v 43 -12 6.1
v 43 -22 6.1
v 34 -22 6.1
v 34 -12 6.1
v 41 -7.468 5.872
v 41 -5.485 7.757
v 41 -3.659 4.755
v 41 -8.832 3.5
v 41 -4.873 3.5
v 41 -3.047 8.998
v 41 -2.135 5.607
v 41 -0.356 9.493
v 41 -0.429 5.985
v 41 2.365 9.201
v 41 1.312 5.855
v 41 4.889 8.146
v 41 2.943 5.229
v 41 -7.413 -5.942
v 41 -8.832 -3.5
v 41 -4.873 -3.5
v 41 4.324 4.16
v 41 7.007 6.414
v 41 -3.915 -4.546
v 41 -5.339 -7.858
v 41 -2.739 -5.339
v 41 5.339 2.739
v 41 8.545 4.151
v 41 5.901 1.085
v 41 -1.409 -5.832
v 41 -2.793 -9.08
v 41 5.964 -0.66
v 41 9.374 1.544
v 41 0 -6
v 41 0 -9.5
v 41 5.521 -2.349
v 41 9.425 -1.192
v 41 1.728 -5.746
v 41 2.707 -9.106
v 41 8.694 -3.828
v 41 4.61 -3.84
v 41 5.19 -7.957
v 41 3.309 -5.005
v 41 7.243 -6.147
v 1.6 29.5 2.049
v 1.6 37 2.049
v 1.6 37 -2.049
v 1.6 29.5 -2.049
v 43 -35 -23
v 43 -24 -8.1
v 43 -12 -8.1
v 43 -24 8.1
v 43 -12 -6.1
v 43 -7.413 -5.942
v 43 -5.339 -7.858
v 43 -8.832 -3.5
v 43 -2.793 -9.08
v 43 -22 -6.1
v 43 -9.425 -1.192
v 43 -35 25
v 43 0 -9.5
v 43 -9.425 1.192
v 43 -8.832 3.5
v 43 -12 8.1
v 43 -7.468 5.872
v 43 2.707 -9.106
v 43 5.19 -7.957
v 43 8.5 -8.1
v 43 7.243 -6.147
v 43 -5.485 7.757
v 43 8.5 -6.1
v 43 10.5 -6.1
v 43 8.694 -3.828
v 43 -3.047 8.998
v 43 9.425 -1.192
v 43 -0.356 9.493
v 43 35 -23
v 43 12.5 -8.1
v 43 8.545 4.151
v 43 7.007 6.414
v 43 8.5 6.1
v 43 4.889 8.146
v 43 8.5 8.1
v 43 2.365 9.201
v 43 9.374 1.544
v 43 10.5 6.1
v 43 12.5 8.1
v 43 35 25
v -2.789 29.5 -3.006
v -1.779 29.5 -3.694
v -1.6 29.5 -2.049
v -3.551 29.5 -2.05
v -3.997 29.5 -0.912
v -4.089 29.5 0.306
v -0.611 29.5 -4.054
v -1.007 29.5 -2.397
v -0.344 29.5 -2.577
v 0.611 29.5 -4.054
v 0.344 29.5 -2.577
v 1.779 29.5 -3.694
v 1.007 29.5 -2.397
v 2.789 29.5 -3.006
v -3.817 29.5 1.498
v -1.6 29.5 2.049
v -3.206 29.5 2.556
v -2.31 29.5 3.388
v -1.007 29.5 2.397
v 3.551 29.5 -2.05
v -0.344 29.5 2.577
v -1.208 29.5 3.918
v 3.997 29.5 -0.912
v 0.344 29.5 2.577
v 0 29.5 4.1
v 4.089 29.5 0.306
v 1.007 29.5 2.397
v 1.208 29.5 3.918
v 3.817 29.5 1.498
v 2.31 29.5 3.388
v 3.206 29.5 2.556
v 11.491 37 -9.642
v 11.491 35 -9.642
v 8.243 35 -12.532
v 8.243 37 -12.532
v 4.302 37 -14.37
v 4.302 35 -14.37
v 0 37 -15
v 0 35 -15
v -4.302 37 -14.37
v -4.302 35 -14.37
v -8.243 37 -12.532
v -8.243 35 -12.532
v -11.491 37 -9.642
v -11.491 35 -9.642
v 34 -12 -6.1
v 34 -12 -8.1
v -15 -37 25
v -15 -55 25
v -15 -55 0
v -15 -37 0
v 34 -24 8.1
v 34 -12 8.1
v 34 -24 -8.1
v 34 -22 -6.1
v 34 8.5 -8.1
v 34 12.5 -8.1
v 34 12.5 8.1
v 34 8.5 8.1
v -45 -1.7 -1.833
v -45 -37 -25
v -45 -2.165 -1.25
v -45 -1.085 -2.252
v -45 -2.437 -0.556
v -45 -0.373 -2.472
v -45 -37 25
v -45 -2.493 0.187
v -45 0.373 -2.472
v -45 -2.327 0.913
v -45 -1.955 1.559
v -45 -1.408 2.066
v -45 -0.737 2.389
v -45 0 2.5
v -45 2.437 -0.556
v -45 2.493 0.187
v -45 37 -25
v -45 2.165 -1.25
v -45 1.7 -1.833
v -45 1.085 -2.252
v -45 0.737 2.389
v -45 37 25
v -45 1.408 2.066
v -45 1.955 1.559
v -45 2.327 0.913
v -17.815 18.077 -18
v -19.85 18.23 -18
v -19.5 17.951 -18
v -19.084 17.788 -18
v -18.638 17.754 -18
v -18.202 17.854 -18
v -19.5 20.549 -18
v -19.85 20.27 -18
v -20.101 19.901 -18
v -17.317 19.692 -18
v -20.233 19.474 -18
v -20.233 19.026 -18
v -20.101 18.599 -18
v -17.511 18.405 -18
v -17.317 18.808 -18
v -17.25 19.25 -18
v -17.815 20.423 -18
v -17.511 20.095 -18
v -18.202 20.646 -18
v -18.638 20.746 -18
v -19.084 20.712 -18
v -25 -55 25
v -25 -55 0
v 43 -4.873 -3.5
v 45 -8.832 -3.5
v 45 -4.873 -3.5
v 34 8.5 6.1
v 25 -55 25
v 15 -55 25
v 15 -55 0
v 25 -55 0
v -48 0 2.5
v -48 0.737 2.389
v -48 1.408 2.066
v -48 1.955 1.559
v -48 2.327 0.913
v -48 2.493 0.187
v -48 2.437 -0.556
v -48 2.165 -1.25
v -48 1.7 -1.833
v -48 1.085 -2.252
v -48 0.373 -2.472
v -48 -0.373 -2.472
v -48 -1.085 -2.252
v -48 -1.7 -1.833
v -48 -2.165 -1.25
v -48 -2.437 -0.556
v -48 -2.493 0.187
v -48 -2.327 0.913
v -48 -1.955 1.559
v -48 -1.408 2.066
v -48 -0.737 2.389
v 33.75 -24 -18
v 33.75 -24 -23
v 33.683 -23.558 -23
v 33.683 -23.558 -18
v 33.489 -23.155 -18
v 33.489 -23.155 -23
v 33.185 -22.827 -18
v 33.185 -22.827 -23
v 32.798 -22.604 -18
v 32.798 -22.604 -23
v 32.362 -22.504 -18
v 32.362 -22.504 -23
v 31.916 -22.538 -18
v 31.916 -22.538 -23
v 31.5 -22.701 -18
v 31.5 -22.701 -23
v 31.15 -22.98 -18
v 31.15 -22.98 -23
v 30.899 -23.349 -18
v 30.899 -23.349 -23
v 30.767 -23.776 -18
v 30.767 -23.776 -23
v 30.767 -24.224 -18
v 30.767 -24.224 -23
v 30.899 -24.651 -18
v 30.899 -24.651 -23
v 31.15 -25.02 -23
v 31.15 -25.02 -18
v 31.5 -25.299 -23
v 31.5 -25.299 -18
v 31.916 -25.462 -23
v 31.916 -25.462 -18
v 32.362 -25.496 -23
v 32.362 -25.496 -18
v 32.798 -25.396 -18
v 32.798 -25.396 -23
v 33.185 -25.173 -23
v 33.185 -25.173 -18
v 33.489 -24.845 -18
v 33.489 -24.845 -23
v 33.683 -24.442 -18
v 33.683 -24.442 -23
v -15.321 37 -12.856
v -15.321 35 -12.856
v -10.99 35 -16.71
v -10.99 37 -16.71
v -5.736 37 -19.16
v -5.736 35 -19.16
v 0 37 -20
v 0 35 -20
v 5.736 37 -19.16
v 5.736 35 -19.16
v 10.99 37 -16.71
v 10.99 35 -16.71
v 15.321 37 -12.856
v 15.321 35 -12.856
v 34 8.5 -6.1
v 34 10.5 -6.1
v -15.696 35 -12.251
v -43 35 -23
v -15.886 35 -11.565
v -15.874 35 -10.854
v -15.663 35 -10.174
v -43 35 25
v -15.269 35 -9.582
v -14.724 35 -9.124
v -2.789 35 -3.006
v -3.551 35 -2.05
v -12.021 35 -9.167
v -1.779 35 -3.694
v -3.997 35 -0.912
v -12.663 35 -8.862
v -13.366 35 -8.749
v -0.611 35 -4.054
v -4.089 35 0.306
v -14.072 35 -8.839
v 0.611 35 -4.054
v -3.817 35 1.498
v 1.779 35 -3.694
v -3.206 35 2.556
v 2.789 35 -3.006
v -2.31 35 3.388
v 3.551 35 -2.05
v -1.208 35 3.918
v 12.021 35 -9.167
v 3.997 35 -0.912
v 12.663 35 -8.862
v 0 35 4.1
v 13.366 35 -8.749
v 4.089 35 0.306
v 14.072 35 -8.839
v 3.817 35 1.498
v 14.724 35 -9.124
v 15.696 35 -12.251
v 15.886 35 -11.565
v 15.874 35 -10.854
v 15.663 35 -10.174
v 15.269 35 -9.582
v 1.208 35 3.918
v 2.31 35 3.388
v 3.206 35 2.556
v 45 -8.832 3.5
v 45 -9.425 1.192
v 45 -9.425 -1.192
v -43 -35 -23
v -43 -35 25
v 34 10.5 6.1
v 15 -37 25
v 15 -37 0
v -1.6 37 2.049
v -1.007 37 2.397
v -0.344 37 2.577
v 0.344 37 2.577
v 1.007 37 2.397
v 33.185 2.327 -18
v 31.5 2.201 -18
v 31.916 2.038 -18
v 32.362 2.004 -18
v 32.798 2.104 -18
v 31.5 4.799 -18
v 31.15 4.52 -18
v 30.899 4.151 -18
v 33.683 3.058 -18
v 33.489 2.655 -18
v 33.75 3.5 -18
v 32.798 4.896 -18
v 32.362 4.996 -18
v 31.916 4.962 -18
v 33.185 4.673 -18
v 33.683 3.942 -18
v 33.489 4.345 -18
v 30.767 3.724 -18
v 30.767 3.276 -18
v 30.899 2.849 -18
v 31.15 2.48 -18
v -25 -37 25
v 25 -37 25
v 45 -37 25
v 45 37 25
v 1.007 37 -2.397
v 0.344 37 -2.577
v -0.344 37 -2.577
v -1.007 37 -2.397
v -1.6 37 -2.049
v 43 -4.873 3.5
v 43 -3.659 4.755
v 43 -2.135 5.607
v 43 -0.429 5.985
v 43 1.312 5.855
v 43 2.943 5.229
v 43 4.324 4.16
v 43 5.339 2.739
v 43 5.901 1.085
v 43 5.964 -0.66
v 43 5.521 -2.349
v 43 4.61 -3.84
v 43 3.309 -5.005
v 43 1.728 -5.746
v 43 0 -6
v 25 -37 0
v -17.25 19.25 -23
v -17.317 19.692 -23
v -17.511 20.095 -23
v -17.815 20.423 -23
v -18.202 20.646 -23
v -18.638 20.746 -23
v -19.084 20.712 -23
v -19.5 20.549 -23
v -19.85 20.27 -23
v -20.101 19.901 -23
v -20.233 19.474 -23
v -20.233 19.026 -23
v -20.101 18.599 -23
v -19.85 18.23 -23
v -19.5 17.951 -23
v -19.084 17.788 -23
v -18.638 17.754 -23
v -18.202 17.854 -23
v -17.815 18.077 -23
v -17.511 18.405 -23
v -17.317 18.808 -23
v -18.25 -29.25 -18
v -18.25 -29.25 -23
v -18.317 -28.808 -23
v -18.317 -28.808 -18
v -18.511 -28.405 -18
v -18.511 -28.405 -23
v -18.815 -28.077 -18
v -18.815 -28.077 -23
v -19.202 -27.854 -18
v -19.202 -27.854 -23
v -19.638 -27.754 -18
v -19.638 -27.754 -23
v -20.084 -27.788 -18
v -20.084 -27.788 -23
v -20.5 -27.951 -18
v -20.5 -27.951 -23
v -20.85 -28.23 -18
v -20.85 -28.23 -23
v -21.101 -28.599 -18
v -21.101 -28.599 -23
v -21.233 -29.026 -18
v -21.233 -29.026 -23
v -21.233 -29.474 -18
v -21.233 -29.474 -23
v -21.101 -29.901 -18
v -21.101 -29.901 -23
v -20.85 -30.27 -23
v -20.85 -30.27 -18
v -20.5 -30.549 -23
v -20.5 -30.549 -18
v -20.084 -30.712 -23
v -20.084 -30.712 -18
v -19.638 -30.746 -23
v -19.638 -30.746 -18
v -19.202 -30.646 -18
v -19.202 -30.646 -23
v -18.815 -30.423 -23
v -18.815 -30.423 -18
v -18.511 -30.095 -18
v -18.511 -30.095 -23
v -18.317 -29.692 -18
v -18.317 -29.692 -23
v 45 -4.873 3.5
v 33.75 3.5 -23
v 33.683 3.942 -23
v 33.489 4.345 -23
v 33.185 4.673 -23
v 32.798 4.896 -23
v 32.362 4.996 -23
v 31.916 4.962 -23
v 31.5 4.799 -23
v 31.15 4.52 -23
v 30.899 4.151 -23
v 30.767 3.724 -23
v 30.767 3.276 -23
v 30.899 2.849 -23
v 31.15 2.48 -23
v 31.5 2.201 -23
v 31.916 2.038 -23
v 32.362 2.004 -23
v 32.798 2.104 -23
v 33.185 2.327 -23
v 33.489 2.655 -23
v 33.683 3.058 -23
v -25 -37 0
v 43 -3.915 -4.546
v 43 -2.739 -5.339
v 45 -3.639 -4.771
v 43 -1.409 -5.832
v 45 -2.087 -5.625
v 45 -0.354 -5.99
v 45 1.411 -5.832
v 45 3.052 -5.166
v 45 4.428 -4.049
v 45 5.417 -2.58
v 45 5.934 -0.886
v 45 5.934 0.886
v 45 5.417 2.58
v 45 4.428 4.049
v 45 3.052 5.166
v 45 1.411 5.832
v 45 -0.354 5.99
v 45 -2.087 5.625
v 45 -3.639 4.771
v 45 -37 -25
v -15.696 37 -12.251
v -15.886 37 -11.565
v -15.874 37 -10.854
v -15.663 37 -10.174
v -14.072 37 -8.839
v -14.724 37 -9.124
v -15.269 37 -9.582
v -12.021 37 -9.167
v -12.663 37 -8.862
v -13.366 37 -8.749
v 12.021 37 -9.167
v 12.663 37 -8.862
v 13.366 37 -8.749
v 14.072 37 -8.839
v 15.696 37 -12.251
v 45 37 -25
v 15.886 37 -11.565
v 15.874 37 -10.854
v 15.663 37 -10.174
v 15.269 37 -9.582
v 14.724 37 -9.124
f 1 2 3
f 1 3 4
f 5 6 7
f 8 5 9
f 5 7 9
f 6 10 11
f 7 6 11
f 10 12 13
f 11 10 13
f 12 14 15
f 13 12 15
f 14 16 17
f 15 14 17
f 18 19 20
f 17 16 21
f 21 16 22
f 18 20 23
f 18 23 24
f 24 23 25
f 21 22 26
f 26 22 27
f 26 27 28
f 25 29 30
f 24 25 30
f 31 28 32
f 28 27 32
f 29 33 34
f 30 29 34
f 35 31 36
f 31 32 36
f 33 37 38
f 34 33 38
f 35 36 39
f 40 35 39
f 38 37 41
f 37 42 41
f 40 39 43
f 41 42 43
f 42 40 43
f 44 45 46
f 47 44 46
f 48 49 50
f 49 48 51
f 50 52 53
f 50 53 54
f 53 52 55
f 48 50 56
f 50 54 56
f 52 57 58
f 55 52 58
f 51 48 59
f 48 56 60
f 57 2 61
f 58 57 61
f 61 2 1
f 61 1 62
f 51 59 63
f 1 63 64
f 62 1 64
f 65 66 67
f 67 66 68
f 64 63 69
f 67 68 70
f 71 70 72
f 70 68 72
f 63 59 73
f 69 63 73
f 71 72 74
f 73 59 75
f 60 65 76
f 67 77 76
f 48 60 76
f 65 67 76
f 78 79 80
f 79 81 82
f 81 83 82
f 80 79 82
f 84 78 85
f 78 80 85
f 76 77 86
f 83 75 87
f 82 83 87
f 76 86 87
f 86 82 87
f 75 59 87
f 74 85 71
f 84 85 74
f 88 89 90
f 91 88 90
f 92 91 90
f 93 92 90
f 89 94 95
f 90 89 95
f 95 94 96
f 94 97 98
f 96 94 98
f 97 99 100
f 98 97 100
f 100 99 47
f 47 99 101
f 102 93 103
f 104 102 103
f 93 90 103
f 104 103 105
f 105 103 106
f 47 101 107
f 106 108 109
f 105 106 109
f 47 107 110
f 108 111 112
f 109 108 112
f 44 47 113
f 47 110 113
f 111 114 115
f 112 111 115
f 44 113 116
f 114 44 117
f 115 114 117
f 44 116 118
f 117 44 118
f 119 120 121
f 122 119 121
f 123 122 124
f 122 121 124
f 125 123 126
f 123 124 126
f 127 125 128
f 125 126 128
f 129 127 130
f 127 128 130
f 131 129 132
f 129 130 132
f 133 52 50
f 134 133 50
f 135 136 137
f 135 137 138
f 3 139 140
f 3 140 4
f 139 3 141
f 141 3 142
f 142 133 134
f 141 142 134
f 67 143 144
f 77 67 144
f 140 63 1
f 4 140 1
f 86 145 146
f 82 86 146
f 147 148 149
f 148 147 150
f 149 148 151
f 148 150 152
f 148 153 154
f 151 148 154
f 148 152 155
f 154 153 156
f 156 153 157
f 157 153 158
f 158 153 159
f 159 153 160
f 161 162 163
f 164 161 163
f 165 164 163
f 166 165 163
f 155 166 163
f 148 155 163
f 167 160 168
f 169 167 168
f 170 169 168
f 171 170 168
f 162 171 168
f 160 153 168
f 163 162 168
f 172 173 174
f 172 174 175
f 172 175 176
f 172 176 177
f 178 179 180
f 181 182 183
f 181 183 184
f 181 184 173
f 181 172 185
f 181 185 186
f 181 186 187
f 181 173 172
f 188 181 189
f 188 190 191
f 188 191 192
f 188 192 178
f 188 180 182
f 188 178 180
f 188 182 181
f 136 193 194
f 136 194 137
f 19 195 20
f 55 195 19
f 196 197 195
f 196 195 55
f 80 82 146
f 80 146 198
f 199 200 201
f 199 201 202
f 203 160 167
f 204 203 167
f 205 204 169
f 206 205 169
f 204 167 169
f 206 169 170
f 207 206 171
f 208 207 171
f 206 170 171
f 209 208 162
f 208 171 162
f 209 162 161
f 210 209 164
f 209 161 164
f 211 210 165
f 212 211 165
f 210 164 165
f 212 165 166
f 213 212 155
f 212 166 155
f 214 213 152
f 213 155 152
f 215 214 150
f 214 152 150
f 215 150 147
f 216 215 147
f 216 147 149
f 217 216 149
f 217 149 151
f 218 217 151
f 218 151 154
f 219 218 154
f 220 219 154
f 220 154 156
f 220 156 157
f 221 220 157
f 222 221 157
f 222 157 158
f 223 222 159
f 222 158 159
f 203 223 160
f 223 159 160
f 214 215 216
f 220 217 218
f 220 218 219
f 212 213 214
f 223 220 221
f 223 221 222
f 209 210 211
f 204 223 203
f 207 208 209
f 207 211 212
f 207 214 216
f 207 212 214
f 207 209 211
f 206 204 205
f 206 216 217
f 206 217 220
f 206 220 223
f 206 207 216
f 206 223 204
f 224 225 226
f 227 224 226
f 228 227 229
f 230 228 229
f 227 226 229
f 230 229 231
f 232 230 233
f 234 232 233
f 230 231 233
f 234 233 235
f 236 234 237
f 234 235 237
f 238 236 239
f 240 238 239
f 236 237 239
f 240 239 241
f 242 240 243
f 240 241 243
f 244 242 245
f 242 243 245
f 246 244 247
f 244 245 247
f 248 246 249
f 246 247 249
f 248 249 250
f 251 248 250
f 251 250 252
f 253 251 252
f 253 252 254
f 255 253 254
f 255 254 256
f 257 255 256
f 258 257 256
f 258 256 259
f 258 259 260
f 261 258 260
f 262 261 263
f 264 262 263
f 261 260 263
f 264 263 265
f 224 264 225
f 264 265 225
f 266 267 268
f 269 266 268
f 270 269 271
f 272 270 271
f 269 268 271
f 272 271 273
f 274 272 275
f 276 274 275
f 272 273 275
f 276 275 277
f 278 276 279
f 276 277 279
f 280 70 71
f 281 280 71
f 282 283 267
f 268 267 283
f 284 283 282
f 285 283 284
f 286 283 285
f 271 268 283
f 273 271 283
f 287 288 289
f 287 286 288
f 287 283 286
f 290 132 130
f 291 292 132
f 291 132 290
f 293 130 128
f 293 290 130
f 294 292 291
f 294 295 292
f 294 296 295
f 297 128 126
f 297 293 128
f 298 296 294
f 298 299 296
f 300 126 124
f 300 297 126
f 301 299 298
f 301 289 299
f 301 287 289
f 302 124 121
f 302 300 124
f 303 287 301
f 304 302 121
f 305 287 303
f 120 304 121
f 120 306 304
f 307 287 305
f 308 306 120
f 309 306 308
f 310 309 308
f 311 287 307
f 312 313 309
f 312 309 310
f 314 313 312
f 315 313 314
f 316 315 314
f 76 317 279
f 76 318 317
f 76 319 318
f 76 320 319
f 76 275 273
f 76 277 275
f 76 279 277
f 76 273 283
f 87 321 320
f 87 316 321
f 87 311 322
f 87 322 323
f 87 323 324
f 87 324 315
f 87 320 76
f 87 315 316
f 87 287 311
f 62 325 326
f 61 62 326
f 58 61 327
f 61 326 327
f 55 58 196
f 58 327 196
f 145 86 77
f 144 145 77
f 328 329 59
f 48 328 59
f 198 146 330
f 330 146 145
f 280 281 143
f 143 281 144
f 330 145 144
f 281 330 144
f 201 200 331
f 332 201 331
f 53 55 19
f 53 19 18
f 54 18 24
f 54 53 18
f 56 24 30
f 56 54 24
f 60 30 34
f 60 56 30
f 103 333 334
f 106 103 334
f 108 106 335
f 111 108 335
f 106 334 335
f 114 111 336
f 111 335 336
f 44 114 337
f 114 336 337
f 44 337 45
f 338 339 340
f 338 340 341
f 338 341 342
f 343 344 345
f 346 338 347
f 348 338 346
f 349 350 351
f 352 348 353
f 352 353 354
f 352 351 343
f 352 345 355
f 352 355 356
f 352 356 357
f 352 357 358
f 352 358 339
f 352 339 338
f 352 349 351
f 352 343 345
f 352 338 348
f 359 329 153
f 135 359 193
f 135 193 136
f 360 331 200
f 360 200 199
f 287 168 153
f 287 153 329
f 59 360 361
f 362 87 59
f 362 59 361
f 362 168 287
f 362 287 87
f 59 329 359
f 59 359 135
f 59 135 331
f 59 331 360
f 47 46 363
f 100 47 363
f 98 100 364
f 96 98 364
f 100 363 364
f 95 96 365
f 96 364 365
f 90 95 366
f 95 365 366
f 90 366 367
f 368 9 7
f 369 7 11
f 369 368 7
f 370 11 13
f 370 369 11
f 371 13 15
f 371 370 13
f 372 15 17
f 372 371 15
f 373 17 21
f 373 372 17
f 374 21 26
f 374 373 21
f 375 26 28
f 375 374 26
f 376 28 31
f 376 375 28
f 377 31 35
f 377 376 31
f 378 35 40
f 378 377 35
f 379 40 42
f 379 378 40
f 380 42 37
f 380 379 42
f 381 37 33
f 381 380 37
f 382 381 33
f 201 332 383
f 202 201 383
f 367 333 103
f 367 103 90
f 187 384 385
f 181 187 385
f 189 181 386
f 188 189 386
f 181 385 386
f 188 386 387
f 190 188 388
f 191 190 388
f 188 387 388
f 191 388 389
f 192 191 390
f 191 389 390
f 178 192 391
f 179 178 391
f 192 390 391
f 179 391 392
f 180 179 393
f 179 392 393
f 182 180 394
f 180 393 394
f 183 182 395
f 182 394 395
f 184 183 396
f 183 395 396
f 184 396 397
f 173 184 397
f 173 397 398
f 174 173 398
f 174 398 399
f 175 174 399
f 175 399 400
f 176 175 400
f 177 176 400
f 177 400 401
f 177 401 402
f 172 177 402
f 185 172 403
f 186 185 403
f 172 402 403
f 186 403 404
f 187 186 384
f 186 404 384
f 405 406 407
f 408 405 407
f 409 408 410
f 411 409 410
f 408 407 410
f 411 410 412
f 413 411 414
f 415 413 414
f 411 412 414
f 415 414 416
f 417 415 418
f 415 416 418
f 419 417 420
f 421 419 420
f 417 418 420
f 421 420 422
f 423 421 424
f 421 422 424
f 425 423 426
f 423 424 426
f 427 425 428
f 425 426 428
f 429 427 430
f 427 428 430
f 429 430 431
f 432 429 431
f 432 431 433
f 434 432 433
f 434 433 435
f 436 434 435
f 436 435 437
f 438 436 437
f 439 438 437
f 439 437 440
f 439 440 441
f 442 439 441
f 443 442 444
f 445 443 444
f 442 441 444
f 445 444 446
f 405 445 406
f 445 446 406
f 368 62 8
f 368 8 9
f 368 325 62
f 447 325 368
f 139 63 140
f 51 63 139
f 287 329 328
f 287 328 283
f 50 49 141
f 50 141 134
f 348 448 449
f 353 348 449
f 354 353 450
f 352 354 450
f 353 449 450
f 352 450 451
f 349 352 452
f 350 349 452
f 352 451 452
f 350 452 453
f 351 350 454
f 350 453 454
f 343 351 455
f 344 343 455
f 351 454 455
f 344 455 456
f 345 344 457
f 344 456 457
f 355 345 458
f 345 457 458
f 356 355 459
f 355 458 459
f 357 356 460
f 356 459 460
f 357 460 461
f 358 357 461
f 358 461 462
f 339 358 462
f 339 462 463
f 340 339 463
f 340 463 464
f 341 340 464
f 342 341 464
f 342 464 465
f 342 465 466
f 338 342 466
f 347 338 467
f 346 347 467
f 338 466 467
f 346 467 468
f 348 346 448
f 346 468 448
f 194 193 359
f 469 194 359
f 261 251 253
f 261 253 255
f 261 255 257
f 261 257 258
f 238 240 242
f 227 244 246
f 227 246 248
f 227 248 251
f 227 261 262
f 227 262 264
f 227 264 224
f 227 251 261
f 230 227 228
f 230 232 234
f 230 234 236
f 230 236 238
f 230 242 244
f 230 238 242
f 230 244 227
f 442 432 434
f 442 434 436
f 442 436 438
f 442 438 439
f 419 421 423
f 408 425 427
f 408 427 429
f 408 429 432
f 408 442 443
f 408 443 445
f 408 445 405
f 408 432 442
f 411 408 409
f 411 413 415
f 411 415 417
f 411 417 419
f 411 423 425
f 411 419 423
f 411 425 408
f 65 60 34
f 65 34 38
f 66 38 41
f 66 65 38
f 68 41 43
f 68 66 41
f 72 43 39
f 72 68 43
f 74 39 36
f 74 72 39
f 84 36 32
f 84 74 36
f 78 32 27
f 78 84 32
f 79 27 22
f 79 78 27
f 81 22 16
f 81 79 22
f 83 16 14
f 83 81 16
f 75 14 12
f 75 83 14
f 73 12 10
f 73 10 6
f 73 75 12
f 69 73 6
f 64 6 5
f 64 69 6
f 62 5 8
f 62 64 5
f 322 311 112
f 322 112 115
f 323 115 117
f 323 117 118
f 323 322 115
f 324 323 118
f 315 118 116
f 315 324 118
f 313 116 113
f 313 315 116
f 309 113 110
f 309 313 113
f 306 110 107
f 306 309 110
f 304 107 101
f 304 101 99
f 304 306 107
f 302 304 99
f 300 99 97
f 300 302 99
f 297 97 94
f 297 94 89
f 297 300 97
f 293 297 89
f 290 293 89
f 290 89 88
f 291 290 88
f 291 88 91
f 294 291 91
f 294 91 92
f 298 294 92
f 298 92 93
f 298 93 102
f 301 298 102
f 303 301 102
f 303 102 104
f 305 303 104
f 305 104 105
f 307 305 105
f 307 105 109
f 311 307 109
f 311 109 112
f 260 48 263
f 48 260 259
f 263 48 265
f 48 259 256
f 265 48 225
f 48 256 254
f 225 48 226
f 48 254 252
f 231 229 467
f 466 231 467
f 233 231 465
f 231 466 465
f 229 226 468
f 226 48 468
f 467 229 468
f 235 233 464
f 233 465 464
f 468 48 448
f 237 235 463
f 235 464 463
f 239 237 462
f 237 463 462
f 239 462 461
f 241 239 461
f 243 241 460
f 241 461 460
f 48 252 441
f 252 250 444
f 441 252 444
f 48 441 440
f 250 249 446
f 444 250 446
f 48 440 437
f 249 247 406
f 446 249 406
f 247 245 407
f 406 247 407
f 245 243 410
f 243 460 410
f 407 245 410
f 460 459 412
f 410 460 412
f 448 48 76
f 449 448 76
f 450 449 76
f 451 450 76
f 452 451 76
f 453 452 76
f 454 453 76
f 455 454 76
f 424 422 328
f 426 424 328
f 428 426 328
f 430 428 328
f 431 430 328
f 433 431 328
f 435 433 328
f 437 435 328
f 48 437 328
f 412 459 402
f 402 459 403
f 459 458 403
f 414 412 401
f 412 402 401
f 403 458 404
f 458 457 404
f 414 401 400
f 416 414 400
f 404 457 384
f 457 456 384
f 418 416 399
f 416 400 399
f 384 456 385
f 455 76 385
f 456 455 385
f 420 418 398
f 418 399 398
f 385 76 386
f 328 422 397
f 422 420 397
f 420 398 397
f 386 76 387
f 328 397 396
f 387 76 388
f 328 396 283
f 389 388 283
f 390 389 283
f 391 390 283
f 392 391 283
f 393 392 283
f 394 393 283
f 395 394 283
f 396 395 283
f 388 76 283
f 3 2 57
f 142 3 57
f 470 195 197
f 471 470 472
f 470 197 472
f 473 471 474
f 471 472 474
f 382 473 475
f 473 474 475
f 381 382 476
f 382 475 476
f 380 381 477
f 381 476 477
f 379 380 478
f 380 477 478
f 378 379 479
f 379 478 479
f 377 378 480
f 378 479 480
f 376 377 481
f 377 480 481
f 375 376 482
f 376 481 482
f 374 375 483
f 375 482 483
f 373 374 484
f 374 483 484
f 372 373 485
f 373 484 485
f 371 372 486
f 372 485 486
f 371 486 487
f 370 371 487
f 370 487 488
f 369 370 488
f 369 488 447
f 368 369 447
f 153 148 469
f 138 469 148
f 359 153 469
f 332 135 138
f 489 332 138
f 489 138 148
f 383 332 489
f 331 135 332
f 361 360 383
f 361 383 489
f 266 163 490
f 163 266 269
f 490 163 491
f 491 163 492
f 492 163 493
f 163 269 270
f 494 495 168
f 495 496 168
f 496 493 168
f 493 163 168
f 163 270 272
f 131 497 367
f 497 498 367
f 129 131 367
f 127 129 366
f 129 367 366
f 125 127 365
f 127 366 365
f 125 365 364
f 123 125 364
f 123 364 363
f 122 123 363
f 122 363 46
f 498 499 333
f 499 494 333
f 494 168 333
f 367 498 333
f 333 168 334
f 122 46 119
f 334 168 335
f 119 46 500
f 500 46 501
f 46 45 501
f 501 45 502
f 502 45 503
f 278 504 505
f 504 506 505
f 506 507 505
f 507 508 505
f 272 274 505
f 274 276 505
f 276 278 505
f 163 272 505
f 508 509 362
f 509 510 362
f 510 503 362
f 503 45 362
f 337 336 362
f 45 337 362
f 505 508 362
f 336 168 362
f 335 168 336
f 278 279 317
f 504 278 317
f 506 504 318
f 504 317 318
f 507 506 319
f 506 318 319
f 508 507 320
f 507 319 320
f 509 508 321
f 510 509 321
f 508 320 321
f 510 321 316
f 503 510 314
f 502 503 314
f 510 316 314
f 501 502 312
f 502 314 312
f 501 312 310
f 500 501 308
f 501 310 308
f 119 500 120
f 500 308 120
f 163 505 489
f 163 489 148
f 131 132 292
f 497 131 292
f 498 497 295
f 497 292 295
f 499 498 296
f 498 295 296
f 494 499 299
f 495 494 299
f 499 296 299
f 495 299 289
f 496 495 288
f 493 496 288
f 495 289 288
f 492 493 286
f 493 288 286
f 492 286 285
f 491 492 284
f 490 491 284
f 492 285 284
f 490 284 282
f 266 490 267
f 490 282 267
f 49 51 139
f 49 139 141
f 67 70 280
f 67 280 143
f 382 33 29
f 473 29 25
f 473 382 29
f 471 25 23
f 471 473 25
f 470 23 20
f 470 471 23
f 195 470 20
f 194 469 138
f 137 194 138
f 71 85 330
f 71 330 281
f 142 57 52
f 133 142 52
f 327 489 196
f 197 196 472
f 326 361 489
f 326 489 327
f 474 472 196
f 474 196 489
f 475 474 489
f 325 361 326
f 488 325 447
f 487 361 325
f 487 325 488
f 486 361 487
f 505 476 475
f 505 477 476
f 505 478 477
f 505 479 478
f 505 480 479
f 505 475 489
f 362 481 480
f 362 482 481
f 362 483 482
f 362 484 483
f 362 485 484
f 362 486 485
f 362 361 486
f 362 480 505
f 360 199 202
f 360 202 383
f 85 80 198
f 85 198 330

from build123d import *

# Parameters (mm, degrees)
SKETCH1_W           = 90
SKETCH1_H           = 74
SKETCH1_W_2         = 86
SKETCH1_H_2         = 70
BOSS_EXTRUDE1_DEPTH = 25
BOSS_EXTRUDE2_START = 25
SKETCH1_3_W         = 10
SKETCH1_3_H         = 18
BOSS_EXTRUDE2_DEPTH = 25
SKETCH2_W           = 86
SKETCH2_H           = 70
BOSS_EXTRUDE3_DEPTH = 2
SKETCH3_W           = 3.2
SKETCH3_H           = 4.098780306
CUT_EXTRUDE1_DEPTH  = 2
SKETCH3_4_R         = 4.1
SKETCH3_4_R_2       = 2.6
BOSS_EXTRUDE4_DEPTH = 7.5
SKETCH4_R           = 6
CUT_EXTRUDE2_DEPTH  = 2
BOSS_EXTRUDE5_START = -2
BOSS_EXTRUDE5_DEPTH = 2
BOSS_EXTRUDE6_START = -2
SKETCH4_4_W         = 16.2
SKETCH4_4_H         = 2
SKETCH4_4_W_2       = 2
SKETCH4_4_H_2       = 10
BOSS_EXTRUDE6_DEPTH = 9
SKETCH6_R           = 1.5
BOSS_EXTRUDE7_DEPTH = 5
SKETCH7_R           = 2.5
BOSS_EXTRUDE8_DEPTH = 3
CUT_EXTRUDE3_DEPTH  = 106.019045892


with BuildPart() as part:
    # Sketch1 → Boss-Extrude1 (new, symmetric)
    with BuildSketch(Plane.XY):
        Rectangle(SKETCH1_W, SKETCH1_H)
        Rectangle(SKETCH1_W_2, SKETCH1_H_2, mode=Mode.SUBTRACT)
    extrude(amount=BOSS_EXTRUDE1_DEPTH, both=True)

    # Sketch1<3> → Boss-Extrude2 (add)
    with BuildSketch(Plane.XY.offset(BOSS_EXTRUDE2_START)):
        with Locations((-20, -46)):
            Rectangle(SKETCH1_3_W, SKETCH1_3_H)
        with Locations((20, -46)):
            Rectangle(SKETCH1_3_W, SKETCH1_3_H)
    extrude(amount=-BOSS_EXTRUDE2_DEPTH)

    # Sketch2 → Boss-Extrude3 (add)
    with BuildSketch(Plane(origin=(0, 0, -25), x_dir=(-1, 0, 0), z_dir=(0, 0, -1))):
        Rectangle(SKETCH2_W, SKETCH2_H)
    extrude(amount=-BOSS_EXTRUDE3_DEPTH)

    # Sketch3 → Cut-Extrude1 (cut)
    with BuildSketch(Plane(origin=(0, 37, 0), x_dir=(1, 0, 0), z_dir=(0, 1, 0))):
        with BuildLine():
            Line((-1.6, 2.049390153), (1.6, 2.049390153))
            ThreePointArc((1.6, 2.049390153), (0, 2.6), (-1.6, 2.049390153))
        make_face()
        Rectangle(SKETCH3_W, SKETCH3_H)
        with BuildLine():
            ThreePointArc((-1.6, -2.049390153), (0, -2.6), (1.6, -2.049390153))
            Line((1.6, -2.049390153), (-1.6, -2.049390153))
        make_face()
    extrude(amount=-CUT_EXTRUDE1_DEPTH, mode=Mode.SUBTRACT)

    # Sketch3<4> → Boss-Extrude4 (add)
    # profile 1 of 3: a face of its own
    with BuildSketch(Plane(origin=(0, 37, 0), x_dir=(1, 0, 0), z_dir=(0, 1, 0))):
        with Locations(Location((0, 0, 0), (0, 0, 270))):
            Circle(SKETCH3_4_R)
        Circle(SKETCH3_4_R_2, mode=Mode.SUBTRACT)
    # profile 2 of 3: a face of its own
    with BuildSketch(Plane(origin=(0, 37, 0), x_dir=(1, 0, 0), z_dir=(0, 1, 0))):
        with BuildLine():
            Line((1.6, 2.049390153), (1.6, -2.049390153))
            ThreePointArc((1.6, -2.049390153), (2.336664289, -1.140175425), (2.6, 0))
            ThreePointArc((2.6, 0), (2.336664289, 1.140175425), (1.6, 2.049390153))
        make_face()
    # profile 3 of 3: a face of its own
    with BuildSketch(Plane(origin=(0, 37, 0), x_dir=(1, 0, 0), z_dir=(0, 1, 0))):
        with BuildLine():
            ThreePointArc((-1.6, 2.049390153), (-2.6, 0), (-1.6, -2.049390153))
            Line((-1.6, -2.049390153), (-1.6, 2.049390153))
        make_face()
    extrude(amount=-BOSS_EXTRUDE4_DEPTH)

    # Sketch4 → Cut-Extrude2 (cut)
    with BuildSketch(Plane(origin=(45, 0, 0), x_dir=(0, 0, -1), z_dir=(1, 0, 0))):
        Circle(SKETCH4_R)
        with BuildLine():
            Line((3.5, -8.831760866), (3.5, -4.873397172))
            ThreePointArc((3.5, -4.873397172), (0, -6), (-3.5, -4.873397172))
            Line((-3.5, -4.873397172), (-3.5, -8.831760866))
            ThreePointArc((-3.5, -8.831760866), (0, -9.5), (3.5, -8.831760866))
        make_face()
    extrude(amount=-CUT_EXTRUDE2_DEPTH, mode=Mode.SUBTRACT)

    # Sketch4<3> → Boss-Extrude5 (add)
    with BuildSketch(Plane(origin=(45, 0, 0), x_dir=(0, 0, -1), z_dir=(1, 0, 0)).offset(BOSS_EXTRUDE5_START)):
        with BuildLine():
            ThreePointArc((6, 0), (5.338539126, -2.738612788), (3.5, -4.873397172))
            Line((3.5, -4.873397172), (3.5, -8.831760866))
            ThreePointArc((3.5, -8.831760866), (7.858116823, -5.338539126), (9.5, 0))
            ThreePointArc((9.5, 0), (-5.338539126, 7.858116823), (-3.5, -8.831760866))
            Line((-3.5, -8.831760866), (-3.5, -4.873397172))
            ThreePointArc((-3.5, -4.873397172), (-2.738612788, 5.338539126), (6, 0))
        make_face()
    extrude(amount=-BOSS_EXTRUDE5_DEPTH)

    # Sketch4<4> → Boss-Extrude6 (add)
    with BuildSketch(Plane(origin=(45, 0, 0), x_dir=(0, 0, -1), z_dir=(1, 0, 0)).offset(BOSS_EXTRUDE6_START)):
        with Locations((0, 11.5)):
            Rectangle(SKETCH4_4_W, SKETCH4_4_H)
        with Locations((-7.1, -17)):
            Rectangle(SKETCH4_4_W_2, SKETCH4_4_H_2)
        with Locations((0, -23)):
            Rectangle(SKETCH4_4_W, SKETCH4_4_H)
        with Locations((7.1, -17)):
            Rectangle(SKETCH4_4_W_2, SKETCH4_4_H_2)
        with Locations((-7.1, 9.5)):
            Rectangle(SKETCH4_4_W_2, SKETCH4_4_H)
        with Locations((7.1, 9.5)):
            Rectangle(SKETCH4_4_W_2, SKETCH4_4_H)
    extrude(amount=-BOSS_EXTRUDE6_DEPTH)

    # Sketch6 → Boss-Extrude7 (add)
    with BuildSketch(Plane.XY.offset(-23)):
        with Locations((32.25, 3.5)):
            Circle(SKETCH6_R)
        with Locations((-18.75, 19.25)):
            Circle(SKETCH6_R)
        with Locations((-19.75, -29.25)):
            Circle(SKETCH6_R)
        with Locations((32.25, -24)):
            Circle(SKETCH6_R)
    extrude(amount=BOSS_EXTRUDE7_DEPTH)

    # Sketch7 → Boss-Extrude8 (add)
    with BuildSketch(Plane.ZY.offset(45)):
        Circle(SKETCH7_R)
    extrude(amount=BOSS_EXTRUDE8_DEPTH)

    # Sketch8 → Cut-Extrude3 (cut, through all)
    with BuildSketch(Plane.XZ.offset(-35)):
        with BuildLine():
            ThreePointArc((11.490666647, -9.641814145), (0, -15), (-11.490666647, -9.641814145))
            Line((-11.490666647, -9.641814145), (-15.320888862, -12.855752194))
            ThreePointArc((-15.320888862, -12.855752194), (0, -20), (15.320888862, -12.855752194))
            Line((15.320888862, -12.855752194), (11.490666647, -9.641814145))
        make_face()
        with BuildLine():
            Line((-15.320888862, -12.855752194), (-11.490666647, -9.641814145))
            ThreePointArc((-11.490666647, -9.641814145), (-15.012746779, -9.333672062), (-15.320888862, -12.855752194))
        make_face()
        with BuildLine():
            ThreePointArc((15.320888862, -12.855752194), (15.012746779, -9.333672062), (11.490666647, -9.641814145))
            Line((11.490666647, -9.641814145), (15.320888862, -12.855752194))
        make_face()
    extrude(amount=-CUT_EXTRUDE3_DEPTH, mode=Mode.SUBTRACT)


solid = part.part
